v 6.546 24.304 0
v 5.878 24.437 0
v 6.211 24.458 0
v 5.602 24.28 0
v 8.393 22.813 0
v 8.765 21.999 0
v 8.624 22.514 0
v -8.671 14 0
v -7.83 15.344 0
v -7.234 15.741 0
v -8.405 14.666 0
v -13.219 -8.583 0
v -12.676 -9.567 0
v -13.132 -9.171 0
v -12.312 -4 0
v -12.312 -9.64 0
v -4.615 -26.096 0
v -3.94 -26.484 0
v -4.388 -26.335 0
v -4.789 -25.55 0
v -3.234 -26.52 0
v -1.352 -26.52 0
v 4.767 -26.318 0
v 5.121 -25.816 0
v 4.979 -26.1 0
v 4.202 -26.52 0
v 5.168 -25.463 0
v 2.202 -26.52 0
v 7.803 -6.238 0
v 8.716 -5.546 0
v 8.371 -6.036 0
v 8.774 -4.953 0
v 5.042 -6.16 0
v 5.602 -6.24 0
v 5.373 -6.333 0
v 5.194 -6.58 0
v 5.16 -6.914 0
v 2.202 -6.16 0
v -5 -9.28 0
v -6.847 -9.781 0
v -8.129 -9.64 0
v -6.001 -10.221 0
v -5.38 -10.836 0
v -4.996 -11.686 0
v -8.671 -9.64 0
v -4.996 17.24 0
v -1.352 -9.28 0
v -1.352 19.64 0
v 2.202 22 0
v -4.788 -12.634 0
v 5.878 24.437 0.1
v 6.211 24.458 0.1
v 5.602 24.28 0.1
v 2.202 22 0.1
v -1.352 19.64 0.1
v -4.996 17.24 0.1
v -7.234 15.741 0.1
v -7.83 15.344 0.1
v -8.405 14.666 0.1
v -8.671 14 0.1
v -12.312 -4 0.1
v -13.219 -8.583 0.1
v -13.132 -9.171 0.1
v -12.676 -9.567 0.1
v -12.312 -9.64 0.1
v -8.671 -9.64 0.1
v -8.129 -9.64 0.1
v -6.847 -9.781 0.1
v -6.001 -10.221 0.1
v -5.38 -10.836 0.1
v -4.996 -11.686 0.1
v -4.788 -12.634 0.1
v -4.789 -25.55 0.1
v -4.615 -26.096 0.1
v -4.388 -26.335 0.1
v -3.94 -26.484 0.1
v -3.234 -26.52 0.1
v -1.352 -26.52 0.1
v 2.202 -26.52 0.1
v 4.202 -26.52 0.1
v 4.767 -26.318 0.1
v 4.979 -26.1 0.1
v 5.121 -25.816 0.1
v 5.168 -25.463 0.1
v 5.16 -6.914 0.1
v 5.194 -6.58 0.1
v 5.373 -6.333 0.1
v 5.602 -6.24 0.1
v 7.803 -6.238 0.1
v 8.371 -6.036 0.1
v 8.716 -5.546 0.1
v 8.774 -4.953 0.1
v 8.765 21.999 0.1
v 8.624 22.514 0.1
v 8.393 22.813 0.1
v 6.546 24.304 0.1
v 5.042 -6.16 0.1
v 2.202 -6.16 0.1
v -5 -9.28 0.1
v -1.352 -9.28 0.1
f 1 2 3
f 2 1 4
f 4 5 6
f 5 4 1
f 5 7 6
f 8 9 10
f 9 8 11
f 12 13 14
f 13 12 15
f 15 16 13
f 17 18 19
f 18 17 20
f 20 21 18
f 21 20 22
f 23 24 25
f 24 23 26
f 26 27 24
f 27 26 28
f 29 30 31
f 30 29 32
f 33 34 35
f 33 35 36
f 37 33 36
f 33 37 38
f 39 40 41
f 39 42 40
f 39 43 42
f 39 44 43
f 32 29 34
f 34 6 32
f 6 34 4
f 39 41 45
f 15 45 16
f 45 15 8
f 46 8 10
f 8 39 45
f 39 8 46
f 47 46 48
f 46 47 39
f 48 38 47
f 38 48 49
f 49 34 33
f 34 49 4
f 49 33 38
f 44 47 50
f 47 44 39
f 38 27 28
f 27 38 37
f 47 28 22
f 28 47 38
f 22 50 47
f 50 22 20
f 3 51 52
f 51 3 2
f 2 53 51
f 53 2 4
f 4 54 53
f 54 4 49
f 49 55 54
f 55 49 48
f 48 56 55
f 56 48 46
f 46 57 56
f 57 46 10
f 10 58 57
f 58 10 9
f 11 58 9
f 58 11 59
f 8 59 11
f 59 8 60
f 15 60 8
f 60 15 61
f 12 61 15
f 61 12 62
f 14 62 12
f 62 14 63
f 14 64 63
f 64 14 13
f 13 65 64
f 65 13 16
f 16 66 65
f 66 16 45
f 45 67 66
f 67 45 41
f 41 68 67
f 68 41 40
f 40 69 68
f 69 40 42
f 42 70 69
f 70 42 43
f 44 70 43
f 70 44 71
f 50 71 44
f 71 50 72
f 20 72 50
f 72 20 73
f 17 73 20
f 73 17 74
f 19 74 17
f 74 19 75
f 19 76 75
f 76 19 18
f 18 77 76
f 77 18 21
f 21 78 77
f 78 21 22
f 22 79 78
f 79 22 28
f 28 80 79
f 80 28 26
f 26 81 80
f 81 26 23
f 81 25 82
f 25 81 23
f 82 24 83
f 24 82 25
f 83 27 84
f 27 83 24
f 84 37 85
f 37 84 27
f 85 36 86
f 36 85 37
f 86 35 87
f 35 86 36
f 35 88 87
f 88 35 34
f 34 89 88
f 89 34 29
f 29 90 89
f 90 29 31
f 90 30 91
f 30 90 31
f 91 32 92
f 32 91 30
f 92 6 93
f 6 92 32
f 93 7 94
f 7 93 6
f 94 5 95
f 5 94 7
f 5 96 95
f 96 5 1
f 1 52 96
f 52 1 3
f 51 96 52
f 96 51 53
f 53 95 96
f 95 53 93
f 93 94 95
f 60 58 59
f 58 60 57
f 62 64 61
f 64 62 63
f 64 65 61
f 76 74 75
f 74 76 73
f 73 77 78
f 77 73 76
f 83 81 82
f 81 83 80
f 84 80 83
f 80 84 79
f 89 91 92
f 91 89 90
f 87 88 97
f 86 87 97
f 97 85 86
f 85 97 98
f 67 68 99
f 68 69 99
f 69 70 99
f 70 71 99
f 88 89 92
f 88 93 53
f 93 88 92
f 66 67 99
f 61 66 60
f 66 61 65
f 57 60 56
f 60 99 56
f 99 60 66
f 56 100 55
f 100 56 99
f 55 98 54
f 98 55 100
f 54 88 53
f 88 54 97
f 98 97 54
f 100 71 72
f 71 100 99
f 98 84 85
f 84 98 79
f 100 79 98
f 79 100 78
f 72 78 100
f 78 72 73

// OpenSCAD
// file: s/13710as02.scad
use <../../lib.scad>
function ldraw_lib__s__13710as02() = [
// 0 ~Sticker Top for Technic Panel Fairing Smooth (Medium) Flat
// 0 Name: s\13710as02.dat
// 0 Author: Philippe Hurbain [Philo]
// 0 !LDRAW_ORG Subpart UPDATE 2022-02
// 0 !LICENSE Licensed under CC BY 2.0 and CC BY 4.0 : see CAreadme.txt
// 
// 0 BFC CERTIFY CCW
  [0,"BFC","CERTIFY"],
  [0,"BFC","CCW"],
// 
// 0 !HISTORY 2022-03-06 [PTadmin] Official Update 2022-02
// 
// 
// 0 // Top surface
// 4 16 16.364 -0.25 60.759 15.527 -0.25 61.145 14.695 -0.25 61.093 14.004 -0.25 60.7
  [4,16,16.364,-0.25,60.759,15.527,-0.25,61.145,14.695,-0.25,61.093,14.004,-0.25,60.7],
// 4 16 21.912 -0.25 54.998 20.983 -0.25 57.032 16.364 -0.25 60.759 14.004 -0.25 60.7
  [4,16,21.912,-0.25,54.998,20.983,-0.25,57.032,16.364,-0.25,60.759,14.004,-0.25,60.7],
// 3 16 21.912 -0.25 54.998 21.561 -0.25 56.284 20.983 -0.25 57.032
  [3,16,21.912,-0.25,54.998,21.561,-0.25,56.284,20.983,-0.25,57.032],
// 4 16 -18.084 -0.25 39.353 -19.575 -0.25 38.36 -21.013 -0.25 36.664 -21.677 -0.25 35
  [4,16,-18.084,-0.25,39.353,-19.575,-0.25,38.36,-21.013,-0.25,36.664,-21.677,-0.25,35],
// 4 16 -31.689 -0.25 -23.918 -30.78 -0.25 -10 -33.048 -0.25 -21.458 -32.83 -0.25 -22.928
  [4,16,-31.689,-0.25,-23.918,-30.78,-0.25,-10,-33.048,-0.25,-21.458,-32.83,-0.25,-22.928],
// 3 16 -31.689 -0.25 -23.918 -30.78 -0.25 -24.1 -30.78 -0.25 -10
  [3,16,-31.689,-0.25,-23.918,-30.78,-0.25,-24.1,-30.78,-0.25,-10],
// 4 16 -9.849 -0.25 -66.209 -11.972 -0.25 -63.874 -11.537 -0.25 -65.239 -10.971 -0.25 -65.837
  [4,16,-9.849,-0.25,-66.209,-11.972,-0.25,-63.874,-11.537,-0.25,-65.239,-10.971,-0.25,-65.837],
// 4 16 -3.379 -0.25 -66.3 -11.972 -0.25 -63.874 -9.849 -0.25 -66.209 -8.084 -0.25 -66.3
  [4,16,-3.379,-0.25,-66.3,-11.972,-0.25,-63.874,-9.849,-0.25,-66.209,-8.084,-0.25,-66.3],
// 4 16 12.802 -0.25 -64.539 10.504 -0.25 -66.3 11.917 -0.25 -65.795 12.448 -0.25 -65.249
  [4,16,12.802,-0.25,-64.539,10.504,-0.25,-66.3,11.917,-0.25,-65.795,12.448,-0.25,-65.249],
// 4 16 5.504 -0.25 -66.3 10.504 -0.25 -66.3 12.802 -0.25 -64.539 12.92 -0.25 -63.658
  [4,16,5.504,-0.25,-66.3,10.504,-0.25,-66.3,12.802,-0.25,-64.539,12.92,-0.25,-63.658],
// 4 16 19.507 -0.25 -15.595 20.928 -0.25 -15.089 21.79 -0.25 -13.866 21.935 -0.25 -12.382
  [4,16,19.507,-0.25,-15.595,20.928,-0.25,-15.089,21.79,-0.25,-13.866,21.935,-0.25,-12.382],
// 3 16 13.432 -0.25 -15.832 14.004 -0.25 -15.6 12.604 -0.25 -15.4
  [3,16,13.432,-0.25,-15.832,14.004,-0.25,-15.6,12.604,-0.25,-15.4],
// 3 16 12.984 -0.25 -16.45 13.432 -0.25 -15.832 12.604 -0.25 -15.4
  [3,16,12.984,-0.25,-16.45,13.432,-0.25,-15.832,12.604,-0.25,-15.4],
// 4 16 5.504 -0.25 -15.4 12.899 -0.25 -17.286 12.984 -0.25 -16.45 12.604 -0.25 -15.4
  [4,16,5.504,-0.25,-15.4,12.899,-0.25,-17.286,12.984,-0.25,-16.45,12.604,-0.25,-15.4],
// 3 16 -20.323 -0.25 -24.1 -17.118 -0.25 -24.453 -12.5 -0.25 -23.2
  [3,16,-20.323,-0.25,-24.1,-17.118,-0.25,-24.453,-12.5,-0.25,-23.2],
// 3 16 -17.118 -0.25 -24.453 -15.003 -0.25 -25.552 -12.5 -0.25 -23.2
  [3,16,-17.118,-0.25,-24.453,-15.003,-0.25,-25.552,-12.5,-0.25,-23.2],
// 3 16 -15.003 -0.25 -25.552 -13.45 -0.25 -27.089 -12.5 -0.25 -23.2
  [3,16,-15.003,-0.25,-25.552,-13.45,-0.25,-27.089,-12.5,-0.25,-23.2],
// 3 16 -13.45 -0.25 -27.089 -12.491 -0.25 -29.214 -12.5 -0.25 -23.2
  [3,16,-13.45,-0.25,-27.089,-12.491,-0.25,-29.214,-12.5,-0.25,-23.2],
// 3 16 14.004 -0.25 -15.6 19.507 -0.25 -15.595 21.935 -0.25 -12.382
  [3,16,14.004,-0.25,-15.6,19.507,-0.25,-15.595,21.935,-0.25,-12.382],
// 4 16 14.004 -0.25 60.7 14.004 -0.25 -15.6 21.935 -0.25 -12.382 21.912 -0.25 54.998
  [4,16,14.004,-0.25,60.7,14.004,-0.25,-15.6,21.935,-0.25,-12.382,21.912,-0.25,54.998],
// 3 16 -21.677 -0.25 -24.1 -20.323 -0.25 -24.1 -12.5 -0.25 -23.2
  [3,16,-21.677,-0.25,-24.1,-20.323,-0.25,-24.1,-12.5,-0.25,-23.2],
// 4 16 -30.78 -0.25 -24.1 -21.677 -0.25 -24.1 -21.677 -0.25 35 -30.78 -0.25 -10
  [4,16,-30.78,-0.25,-24.1,-21.677,-0.25,-24.1,-21.677,-0.25,35,-30.78,-0.25,-10],
// 3 16 -18.084 -0.25 39.353 -21.677 -0.25 35 -12.491 -0.25 43.1
  [3,16,-18.084,-0.25,39.353,-21.677,-0.25,35,-12.491,-0.25,43.1],
// 4 16 -21.677 -0.25 35 -21.677 -0.25 -24.1 -12.5 -0.25 -23.2 -12.491 -0.25 43.1
  [4,16,-21.677,-0.25,35,-21.677,-0.25,-24.1,-12.5,-0.25,-23.2,-12.491,-0.25,43.1],
// 4 16 -12.5 -0.25 -23.2 -3.379 -0.25 -23.2 -3.379 -0.25 49.1 -12.491 -0.25 43.1
  [4,16,-12.5,-0.25,-23.2,-3.379,-0.25,-23.2,-3.379,-0.25,49.1,-12.491,-0.25,43.1],
// 4 16 -3.379 -0.25 -23.2 5.504 -0.25 -15.4 5.504 -0.25 55 -3.379 -0.25 49.1
  [4,16,-3.379,-0.25,-23.2,5.504,-0.25,-15.4,5.504,-0.25,55,-3.379,-0.25,49.1],
// 4 16 14.004 -0.25 60.7 5.504 -0.25 55 12.604 -0.25 -15.4 14.004 -0.25 -15.6
  [4,16,14.004,-0.25,60.7,5.504,-0.25,55,12.604,-0.25,-15.4,14.004,-0.25,-15.6],
// 3 16 5.504 -0.25 -15.4 12.604 -0.25 -15.4 5.504 -0.25 55
  [3,16,5.504,-0.25,-15.4,12.604,-0.25,-15.4,5.504,-0.25,55],
// 4 16 -11.97 -0.25 -31.586 -3.379 -0.25 -23.2 -12.5 -0.25 -23.2 -12.491 -0.25 -29.214
  [4,16,-11.97,-0.25,-31.586,-3.379,-0.25,-23.2,-12.5,-0.25,-23.2,-12.491,-0.25,-29.214],
// 4 16 5.504 -0.25 -66.3 12.92 -0.25 -63.658 12.899 -0.25 -17.286 5.504 -0.25 -15.4
  [4,16,5.504,-0.25,-66.3,12.92,-0.25,-63.658,12.899,-0.25,-17.286,5.504,-0.25,-15.4],
// 4 16 -3.379 -0.25 -66.3 5.504 -0.25 -66.3 5.504 -0.25 -15.4 -3.379 -0.25 -23.2
  [4,16,-3.379,-0.25,-66.3,5.504,-0.25,-66.3,5.504,-0.25,-15.4,-3.379,-0.25,-23.2],
// 4 16 -11.972 -0.25 -63.874 -3.379 -0.25 -66.3 -3.379 -0.25 -23.2 -11.97 -0.25 -31.586
  [4,16,-11.972,-0.25,-63.874,-3.379,-0.25,-66.3,-3.379,-0.25,-23.2,-11.97,-0.25,-31.586],
];
makepoly(ldraw_lib__s__13710as02(), line=0.2);
// main file
use <../lib.scad>
use <s/13710as01.scad>
use <s/13710as02.scad>
function ldraw_lib__13710c() = [
// 0 Sticker Mindstorms EV3 #3 for Panel Smooth Medium (Needs Work)
// 0 Name: 13710c.dat
// 0 Author: Philippe Hurbain [Philo]
// 0 !LDRAW_ORG Part UPDATE 2022-02
// 0 !LICENSE Licensed under CC BY 2.0 and CC BY 4.0 : see CAreadme.txt
// 
// 0 !HELP To be used with panel 64683
// 
// 0 BFC CERTIFY CCW
  [0,"BFC","CERTIFY"],
  [0,"BFC","CCW"],
// 
// 0 !HISTORY 2022-03-06 [PTadmin] Official Update 2022-02
// 
// 
// 0 // Image file courtesy of the LEGO MINDSTORMS Team
// 0 // Needs Work: Missing more detailed fallback pattern
// 
// 1 16 0 0 0 1 0 0 0 1 0 0 0 1 s\13710as01.dat
  [1,16,0,0,0,1,0,0,0,1,0,0,0,1, ldraw_lib__s__13710as01()],
// 0 !TEXMAP START PLANAR -33.048 0 -66.3 -33.048 0 61.145 21.935 0 -66.3 13710c.png
// 0 !: 1 15 0 0 0 1 0 0 0 1 0 0 0 1 s\13710as02.dat
// 0 !TEXMAP FALLBACK
// 1 15 0 0 0 1 0 0 0 1 0 0 0 1 s\13710as02.dat
  [1,15,0,0,0,1,0,0,0,1,0,0,0,1, ldraw_lib__s__13710as02()],
// 0 !TEXMAP END
];
makepoly(ldraw_lib__13710c(), line=0.2);
